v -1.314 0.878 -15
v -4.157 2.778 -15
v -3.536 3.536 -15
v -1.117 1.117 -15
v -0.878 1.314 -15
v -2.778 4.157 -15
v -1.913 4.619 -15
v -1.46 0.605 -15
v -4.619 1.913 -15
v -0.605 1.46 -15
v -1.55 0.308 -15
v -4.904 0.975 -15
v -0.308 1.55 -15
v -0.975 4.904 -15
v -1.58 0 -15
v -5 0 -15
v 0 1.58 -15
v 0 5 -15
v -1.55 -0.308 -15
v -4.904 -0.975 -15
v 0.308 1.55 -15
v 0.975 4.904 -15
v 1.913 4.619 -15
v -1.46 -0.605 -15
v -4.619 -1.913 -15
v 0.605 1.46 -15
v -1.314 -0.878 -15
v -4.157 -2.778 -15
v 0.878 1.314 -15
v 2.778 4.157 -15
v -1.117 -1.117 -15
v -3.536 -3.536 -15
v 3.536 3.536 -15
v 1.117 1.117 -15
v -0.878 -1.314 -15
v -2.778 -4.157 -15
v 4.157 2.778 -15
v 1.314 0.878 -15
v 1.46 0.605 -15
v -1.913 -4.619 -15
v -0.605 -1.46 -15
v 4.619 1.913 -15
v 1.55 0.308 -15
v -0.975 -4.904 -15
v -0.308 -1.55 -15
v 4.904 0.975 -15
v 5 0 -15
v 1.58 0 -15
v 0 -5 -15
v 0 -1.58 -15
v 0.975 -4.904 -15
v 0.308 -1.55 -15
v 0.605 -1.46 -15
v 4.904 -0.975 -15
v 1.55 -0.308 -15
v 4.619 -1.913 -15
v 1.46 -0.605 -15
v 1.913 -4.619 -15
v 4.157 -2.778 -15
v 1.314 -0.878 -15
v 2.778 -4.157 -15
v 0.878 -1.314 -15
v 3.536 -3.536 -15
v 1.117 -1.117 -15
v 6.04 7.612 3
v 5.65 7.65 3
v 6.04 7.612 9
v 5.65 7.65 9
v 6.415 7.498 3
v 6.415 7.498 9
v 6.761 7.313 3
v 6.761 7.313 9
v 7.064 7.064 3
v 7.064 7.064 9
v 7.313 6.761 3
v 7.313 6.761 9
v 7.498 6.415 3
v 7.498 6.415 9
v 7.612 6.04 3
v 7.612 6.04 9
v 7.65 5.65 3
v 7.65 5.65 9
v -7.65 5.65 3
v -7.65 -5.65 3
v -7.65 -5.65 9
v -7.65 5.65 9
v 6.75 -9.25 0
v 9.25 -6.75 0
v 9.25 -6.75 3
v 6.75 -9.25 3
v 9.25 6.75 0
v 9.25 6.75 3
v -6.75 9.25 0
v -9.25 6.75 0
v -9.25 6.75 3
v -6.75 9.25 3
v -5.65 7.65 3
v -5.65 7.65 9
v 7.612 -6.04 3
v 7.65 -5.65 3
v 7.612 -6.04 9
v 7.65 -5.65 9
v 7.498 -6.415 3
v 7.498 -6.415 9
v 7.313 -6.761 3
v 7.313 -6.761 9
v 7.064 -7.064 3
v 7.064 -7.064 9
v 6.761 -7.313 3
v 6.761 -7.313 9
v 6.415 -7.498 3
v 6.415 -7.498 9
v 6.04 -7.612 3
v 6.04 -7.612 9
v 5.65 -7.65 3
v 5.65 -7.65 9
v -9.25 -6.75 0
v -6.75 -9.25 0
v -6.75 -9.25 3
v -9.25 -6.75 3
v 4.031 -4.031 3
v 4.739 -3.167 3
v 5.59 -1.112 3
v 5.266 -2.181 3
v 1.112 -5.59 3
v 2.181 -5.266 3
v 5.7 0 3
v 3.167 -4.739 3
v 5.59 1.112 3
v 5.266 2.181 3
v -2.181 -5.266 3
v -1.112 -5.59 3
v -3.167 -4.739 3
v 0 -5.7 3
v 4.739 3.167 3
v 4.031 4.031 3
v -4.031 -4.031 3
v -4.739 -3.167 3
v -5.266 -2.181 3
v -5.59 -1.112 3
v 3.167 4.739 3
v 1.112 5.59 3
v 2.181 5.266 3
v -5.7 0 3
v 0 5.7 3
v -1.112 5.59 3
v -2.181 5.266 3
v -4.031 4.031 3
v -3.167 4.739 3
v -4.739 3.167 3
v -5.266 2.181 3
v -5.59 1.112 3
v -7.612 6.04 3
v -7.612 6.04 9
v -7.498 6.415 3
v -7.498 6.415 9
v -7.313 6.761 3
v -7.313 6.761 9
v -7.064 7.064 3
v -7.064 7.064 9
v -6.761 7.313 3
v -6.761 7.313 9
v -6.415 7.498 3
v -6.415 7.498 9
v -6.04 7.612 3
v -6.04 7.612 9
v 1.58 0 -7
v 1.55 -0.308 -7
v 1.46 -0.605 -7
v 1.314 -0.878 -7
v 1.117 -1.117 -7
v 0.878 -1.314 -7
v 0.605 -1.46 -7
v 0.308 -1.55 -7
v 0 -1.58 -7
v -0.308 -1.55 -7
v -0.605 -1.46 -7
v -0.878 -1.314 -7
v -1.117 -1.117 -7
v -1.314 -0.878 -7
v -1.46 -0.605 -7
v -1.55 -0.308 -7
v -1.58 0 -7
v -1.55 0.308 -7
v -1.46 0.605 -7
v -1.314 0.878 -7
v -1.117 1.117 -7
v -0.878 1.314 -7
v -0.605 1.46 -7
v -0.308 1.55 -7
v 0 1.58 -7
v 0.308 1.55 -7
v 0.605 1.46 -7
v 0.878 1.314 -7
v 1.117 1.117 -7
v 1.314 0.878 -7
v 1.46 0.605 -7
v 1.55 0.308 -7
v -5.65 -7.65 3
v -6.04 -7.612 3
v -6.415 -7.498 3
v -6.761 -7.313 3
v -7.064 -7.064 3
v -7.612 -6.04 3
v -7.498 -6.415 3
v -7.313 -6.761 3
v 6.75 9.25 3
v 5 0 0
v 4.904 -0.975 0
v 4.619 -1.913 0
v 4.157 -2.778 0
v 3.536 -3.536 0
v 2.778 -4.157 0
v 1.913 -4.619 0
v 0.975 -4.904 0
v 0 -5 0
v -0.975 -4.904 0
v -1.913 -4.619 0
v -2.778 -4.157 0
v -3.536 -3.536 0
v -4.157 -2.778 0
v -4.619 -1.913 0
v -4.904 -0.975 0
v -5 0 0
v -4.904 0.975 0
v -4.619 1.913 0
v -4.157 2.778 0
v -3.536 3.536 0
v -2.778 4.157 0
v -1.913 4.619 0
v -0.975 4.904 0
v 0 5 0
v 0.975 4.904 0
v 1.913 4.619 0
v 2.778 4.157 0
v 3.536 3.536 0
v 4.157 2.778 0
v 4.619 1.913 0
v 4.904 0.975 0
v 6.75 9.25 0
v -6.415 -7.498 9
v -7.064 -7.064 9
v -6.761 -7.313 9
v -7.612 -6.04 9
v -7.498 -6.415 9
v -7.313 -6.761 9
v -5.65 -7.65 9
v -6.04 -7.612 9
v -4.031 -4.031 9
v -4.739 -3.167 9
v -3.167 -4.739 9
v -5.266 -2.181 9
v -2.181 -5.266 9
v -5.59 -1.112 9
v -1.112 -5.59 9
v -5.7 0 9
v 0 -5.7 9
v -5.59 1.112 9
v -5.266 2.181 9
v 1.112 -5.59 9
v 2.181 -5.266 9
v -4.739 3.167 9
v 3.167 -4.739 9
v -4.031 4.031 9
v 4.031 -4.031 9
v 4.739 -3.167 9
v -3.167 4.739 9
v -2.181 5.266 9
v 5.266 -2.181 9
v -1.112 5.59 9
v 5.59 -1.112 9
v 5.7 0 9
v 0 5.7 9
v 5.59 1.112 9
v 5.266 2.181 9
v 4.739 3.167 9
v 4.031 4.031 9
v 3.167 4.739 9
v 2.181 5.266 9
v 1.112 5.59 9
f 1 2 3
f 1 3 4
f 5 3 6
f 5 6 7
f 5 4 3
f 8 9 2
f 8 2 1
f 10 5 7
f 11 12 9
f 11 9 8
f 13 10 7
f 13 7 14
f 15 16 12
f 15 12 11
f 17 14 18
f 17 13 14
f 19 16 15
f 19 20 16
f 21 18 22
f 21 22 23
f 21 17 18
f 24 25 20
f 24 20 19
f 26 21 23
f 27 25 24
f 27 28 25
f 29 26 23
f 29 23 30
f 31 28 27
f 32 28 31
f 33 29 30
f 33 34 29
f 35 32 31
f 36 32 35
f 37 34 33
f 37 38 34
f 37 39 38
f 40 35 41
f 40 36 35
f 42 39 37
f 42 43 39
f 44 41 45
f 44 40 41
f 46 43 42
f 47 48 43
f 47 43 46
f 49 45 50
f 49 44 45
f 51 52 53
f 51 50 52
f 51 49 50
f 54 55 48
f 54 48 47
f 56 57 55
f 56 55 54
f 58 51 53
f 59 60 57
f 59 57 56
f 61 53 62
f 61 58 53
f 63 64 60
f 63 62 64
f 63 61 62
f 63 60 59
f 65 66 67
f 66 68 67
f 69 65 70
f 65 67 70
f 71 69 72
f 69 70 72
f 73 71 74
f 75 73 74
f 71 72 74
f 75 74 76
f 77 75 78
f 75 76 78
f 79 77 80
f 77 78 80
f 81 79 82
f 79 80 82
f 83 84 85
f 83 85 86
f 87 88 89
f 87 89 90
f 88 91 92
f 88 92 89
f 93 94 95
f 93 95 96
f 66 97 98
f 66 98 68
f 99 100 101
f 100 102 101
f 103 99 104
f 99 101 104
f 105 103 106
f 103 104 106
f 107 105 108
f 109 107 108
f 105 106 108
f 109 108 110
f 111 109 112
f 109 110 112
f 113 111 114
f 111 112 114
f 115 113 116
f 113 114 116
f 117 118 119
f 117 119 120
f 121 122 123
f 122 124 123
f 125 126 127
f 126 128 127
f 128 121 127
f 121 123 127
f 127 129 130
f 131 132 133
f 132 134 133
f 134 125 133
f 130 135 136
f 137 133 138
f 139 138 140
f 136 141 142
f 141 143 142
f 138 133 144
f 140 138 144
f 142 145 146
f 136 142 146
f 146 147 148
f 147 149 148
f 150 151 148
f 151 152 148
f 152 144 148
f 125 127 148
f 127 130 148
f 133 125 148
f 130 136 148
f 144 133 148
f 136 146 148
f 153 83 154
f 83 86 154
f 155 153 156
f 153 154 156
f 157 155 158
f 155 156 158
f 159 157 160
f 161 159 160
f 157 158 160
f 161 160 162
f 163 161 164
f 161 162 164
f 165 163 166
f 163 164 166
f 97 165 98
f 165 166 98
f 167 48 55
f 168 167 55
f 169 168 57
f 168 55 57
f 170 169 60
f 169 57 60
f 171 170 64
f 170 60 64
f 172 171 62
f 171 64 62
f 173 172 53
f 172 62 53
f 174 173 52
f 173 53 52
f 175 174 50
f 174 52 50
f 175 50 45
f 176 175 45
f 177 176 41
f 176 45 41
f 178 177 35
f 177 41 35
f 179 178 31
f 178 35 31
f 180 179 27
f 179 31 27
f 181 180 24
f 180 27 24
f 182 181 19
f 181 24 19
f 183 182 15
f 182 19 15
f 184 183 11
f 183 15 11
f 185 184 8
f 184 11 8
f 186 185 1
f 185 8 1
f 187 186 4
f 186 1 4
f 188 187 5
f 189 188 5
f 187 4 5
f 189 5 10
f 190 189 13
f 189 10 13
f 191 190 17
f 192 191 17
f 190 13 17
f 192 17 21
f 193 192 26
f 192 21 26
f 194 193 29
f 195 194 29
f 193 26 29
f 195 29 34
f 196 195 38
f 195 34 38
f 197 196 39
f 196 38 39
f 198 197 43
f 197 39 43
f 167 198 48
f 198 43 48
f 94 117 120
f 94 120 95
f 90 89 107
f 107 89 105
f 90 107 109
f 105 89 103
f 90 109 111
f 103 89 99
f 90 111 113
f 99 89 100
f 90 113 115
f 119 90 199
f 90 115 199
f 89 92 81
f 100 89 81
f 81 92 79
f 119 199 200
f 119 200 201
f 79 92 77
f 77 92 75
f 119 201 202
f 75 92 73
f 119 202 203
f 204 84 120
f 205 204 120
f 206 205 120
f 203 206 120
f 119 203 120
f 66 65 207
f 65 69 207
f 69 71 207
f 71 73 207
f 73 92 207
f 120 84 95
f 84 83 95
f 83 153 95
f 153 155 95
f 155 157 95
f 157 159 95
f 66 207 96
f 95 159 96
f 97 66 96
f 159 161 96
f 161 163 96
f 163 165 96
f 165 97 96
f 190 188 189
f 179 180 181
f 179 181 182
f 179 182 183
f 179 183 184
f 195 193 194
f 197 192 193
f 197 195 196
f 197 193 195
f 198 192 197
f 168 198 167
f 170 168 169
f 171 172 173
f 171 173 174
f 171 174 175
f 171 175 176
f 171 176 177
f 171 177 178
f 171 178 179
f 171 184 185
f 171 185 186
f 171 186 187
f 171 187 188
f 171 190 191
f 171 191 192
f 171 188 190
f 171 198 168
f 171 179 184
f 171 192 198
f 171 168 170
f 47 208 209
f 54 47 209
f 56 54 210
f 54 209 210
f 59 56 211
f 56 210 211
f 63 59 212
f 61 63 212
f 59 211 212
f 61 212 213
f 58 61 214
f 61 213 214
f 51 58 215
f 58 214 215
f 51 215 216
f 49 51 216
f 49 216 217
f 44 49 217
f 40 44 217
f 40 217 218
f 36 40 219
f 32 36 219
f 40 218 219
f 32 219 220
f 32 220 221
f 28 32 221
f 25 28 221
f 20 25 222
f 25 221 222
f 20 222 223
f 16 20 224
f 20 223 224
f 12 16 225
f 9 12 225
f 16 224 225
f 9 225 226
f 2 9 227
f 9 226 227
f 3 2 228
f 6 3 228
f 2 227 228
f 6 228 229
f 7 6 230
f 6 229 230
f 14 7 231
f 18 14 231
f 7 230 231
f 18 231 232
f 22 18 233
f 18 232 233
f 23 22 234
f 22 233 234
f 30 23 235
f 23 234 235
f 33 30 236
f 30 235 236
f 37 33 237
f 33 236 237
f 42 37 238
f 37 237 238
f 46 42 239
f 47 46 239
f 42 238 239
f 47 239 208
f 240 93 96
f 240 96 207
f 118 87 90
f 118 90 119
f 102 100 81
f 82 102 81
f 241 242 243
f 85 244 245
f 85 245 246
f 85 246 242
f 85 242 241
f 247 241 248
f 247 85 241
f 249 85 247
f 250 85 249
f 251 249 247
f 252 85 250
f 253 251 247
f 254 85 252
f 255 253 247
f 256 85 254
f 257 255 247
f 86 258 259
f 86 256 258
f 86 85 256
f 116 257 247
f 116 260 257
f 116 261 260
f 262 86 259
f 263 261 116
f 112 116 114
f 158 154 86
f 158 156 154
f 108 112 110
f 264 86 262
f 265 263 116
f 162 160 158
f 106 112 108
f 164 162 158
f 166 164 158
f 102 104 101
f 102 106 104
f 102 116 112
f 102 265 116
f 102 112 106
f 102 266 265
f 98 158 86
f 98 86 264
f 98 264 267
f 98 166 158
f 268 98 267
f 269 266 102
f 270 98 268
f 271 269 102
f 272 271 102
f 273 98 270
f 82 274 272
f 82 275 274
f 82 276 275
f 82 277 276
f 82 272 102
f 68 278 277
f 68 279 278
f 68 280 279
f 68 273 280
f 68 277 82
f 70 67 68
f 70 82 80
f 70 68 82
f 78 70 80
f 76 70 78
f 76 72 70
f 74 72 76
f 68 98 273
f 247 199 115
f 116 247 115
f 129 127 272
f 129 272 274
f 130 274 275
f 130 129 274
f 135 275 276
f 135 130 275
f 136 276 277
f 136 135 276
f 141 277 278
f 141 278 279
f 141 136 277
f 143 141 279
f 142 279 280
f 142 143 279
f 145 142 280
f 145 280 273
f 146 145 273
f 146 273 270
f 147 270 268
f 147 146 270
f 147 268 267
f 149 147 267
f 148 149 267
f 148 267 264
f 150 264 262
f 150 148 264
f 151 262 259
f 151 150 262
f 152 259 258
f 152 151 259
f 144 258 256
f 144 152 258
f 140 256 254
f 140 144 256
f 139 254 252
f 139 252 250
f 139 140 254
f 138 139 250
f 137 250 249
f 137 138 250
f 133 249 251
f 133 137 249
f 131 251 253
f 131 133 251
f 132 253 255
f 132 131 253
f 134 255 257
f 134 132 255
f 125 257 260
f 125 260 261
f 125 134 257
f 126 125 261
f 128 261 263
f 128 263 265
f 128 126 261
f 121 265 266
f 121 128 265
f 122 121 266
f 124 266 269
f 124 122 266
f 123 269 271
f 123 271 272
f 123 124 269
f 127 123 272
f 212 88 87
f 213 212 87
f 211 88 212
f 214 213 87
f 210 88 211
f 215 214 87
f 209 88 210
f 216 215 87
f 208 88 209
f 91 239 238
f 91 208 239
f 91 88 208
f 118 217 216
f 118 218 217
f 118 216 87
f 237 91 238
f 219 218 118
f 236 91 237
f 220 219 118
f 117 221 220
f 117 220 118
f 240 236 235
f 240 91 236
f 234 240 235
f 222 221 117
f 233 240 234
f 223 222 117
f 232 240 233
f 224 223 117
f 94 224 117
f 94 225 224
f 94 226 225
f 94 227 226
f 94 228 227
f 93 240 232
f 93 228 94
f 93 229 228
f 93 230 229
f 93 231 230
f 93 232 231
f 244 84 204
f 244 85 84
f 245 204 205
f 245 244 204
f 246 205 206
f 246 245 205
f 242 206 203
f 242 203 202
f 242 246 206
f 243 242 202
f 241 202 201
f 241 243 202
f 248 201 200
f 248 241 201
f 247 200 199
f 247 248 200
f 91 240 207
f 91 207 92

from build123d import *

# Parameters (mm, degrees)
PAD_DEPTH    = 3
SKETCH001_W  = 15.3
SKETCH001_H  = 15.3
SKETCH001_R  = 5.7
PAD001_DEPTH = 6
SKETCH002_R  = 5
PAD002_DEPTH = 15
SKETCH003_R  = 1.58
POCKET_DEPTH = 8
FILLET_R     = 2


with BuildPart() as part:
    # Sketch → Pad (new body)
    with BuildSketch(Plane.XY):
        Polygon((-9.25, 6.75), (-6.75, 9.25), (6.75, 9.25), (9.25, 6.75), (9.25, -6.75), (6.75, -9.25), (-6.75, -9.25), (-9.25, -6.75), align=None)
    extrude(amount=PAD_DEPTH)

    # Sketch001 → Pad001 (new body)
    with BuildSketch(Plane.XY.offset(3)):
        Rectangle(SKETCH001_W, SKETCH001_H)
        Circle(SKETCH001_R, mode=Mode.SUBTRACT)
    extrude(amount=PAD001_DEPTH)

    # Sketch002 → Pad002 (new body)
    with BuildSketch(Plane(origin=(0, 0, 0), x_dir=(1, 0, 0), z_dir=(0, 0, -1))):
        Circle(SKETCH002_R)
    extrude(amount=PAD002_DEPTH)

    # Sketch003 → Pocket (cut)
    with BuildSketch(Plane(origin=(0, 0, -15), x_dir=(1, 0, 0), z_dir=(0, 0, -1))):
        Circle(SKETCH003_R)
    extrude(amount=-POCKET_DEPTH, mode=Mode.SUBTRACT)

    # Fillet
    fillet_edges = [part.edges().sort_by_distance(p)[0] for p in [
        (-7.65, -7.65, 6),
        (7.65, -7.65, 6),
        (-7.65, 7.65, 6),
        (7.65, 7.65, 6),
    ]]
    fillet(fillet_edges, radius=FILLET_R)


solid = part.part
